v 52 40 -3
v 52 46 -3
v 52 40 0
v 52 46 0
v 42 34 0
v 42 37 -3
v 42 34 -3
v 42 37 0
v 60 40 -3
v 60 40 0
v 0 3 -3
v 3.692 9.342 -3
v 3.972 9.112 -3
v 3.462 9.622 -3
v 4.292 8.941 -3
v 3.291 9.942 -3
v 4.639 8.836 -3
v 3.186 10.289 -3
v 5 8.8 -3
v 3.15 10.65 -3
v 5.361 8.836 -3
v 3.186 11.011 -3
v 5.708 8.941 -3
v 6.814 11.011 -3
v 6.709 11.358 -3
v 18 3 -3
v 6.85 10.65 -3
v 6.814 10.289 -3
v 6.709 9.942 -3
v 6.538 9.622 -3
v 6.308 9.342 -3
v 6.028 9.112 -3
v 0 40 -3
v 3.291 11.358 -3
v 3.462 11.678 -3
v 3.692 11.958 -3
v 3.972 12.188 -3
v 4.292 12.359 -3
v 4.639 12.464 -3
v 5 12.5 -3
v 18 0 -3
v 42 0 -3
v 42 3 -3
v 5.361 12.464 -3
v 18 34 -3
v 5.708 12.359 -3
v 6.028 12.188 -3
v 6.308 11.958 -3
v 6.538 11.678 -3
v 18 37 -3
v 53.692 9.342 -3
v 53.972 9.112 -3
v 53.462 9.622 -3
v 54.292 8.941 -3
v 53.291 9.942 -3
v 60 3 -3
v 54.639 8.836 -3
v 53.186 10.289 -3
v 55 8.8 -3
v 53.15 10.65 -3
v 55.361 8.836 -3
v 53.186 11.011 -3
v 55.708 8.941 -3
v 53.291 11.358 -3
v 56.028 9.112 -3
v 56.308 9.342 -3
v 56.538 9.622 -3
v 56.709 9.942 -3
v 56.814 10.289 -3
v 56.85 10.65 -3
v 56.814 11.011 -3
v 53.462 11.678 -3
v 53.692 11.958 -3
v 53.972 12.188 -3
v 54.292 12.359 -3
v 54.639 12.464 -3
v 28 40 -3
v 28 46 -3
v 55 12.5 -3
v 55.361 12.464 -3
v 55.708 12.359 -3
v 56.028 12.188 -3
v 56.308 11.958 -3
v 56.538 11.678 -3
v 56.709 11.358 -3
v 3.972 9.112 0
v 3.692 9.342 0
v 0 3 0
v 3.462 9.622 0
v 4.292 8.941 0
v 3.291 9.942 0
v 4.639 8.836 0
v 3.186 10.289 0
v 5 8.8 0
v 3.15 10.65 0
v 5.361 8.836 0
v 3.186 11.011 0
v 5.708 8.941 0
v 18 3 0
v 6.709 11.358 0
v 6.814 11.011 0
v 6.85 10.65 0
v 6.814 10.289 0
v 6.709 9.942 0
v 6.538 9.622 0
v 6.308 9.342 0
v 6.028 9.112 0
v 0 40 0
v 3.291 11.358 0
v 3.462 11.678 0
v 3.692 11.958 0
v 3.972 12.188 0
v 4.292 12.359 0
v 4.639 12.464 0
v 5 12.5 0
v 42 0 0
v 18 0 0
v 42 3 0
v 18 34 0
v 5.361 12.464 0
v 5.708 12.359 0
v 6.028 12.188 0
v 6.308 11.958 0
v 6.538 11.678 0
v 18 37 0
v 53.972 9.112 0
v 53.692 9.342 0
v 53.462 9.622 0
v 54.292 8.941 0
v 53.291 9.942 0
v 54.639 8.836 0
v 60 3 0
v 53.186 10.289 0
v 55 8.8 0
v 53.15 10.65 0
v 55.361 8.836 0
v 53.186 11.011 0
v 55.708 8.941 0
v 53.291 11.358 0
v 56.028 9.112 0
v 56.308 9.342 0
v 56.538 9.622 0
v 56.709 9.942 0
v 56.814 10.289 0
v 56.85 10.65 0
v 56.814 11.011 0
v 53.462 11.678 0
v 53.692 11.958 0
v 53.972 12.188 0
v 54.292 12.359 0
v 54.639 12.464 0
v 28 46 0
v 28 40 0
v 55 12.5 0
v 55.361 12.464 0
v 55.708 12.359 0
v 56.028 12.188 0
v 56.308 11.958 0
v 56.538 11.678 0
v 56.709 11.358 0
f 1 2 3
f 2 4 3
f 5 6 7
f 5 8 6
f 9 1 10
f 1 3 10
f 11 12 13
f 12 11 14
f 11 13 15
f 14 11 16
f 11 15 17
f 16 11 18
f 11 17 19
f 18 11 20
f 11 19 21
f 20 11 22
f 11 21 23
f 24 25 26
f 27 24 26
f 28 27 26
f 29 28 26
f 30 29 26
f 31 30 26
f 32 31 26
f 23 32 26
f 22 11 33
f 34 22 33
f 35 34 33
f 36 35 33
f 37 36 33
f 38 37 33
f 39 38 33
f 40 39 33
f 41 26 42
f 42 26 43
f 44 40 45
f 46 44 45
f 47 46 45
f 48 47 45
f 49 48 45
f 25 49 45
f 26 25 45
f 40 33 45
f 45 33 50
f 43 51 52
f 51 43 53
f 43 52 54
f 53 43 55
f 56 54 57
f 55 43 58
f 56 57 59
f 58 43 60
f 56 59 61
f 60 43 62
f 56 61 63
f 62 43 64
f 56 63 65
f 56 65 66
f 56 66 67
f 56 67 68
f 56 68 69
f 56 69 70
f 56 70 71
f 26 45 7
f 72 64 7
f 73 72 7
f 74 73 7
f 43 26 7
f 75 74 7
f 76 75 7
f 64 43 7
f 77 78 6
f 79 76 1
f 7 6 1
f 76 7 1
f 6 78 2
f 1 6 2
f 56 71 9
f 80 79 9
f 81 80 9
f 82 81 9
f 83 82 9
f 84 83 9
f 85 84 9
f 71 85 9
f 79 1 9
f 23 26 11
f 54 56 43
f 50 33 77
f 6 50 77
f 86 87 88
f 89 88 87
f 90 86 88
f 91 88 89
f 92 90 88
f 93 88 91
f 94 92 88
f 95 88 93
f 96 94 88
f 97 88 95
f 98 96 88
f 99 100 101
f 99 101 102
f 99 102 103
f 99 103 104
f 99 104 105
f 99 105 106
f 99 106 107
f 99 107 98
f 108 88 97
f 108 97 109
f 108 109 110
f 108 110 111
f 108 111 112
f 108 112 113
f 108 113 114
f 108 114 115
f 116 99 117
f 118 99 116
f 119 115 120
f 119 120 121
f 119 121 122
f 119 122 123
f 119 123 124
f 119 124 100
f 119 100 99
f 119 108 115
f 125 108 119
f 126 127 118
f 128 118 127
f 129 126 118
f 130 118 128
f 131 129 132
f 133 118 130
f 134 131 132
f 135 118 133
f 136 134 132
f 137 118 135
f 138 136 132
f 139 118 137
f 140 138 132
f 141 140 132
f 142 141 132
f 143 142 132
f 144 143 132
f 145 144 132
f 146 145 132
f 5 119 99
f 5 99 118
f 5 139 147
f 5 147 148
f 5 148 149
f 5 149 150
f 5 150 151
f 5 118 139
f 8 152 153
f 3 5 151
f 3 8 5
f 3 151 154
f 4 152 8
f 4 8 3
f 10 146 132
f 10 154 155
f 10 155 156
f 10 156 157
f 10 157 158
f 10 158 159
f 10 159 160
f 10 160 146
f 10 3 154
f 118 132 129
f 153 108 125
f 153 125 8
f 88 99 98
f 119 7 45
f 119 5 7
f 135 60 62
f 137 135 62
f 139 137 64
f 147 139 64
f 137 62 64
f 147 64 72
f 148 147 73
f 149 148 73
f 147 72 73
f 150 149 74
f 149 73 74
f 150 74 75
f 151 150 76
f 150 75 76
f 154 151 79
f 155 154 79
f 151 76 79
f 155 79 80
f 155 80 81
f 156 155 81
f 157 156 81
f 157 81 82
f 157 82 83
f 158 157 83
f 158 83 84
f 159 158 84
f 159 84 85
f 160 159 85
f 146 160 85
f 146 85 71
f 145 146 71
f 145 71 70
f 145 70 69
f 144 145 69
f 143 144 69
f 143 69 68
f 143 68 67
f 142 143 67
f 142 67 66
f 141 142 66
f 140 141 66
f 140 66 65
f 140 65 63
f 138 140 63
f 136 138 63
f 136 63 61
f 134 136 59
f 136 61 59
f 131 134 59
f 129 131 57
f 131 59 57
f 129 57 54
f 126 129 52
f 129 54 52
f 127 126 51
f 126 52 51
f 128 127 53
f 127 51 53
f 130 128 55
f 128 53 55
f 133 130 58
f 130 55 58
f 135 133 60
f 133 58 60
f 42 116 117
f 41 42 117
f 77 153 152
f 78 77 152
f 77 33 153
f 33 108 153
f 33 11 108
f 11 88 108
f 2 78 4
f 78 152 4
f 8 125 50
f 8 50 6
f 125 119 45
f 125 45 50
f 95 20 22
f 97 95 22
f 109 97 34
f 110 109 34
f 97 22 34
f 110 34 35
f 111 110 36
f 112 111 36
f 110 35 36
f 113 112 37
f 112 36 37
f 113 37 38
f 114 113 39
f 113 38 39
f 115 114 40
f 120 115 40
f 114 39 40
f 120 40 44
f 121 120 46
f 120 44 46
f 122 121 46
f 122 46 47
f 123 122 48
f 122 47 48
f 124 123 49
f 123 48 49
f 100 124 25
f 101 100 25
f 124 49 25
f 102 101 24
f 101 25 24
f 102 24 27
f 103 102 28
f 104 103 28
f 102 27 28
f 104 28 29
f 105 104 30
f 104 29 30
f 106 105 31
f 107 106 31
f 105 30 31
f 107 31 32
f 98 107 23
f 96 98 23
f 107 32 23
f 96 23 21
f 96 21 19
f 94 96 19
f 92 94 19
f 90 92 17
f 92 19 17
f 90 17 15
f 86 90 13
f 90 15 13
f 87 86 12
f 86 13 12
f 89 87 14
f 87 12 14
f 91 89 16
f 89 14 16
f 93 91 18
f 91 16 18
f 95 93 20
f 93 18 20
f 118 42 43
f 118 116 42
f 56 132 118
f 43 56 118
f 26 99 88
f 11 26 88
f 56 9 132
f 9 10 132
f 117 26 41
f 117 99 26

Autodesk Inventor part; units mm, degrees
ref_plane "YZ Plane" through (0, 0, 0) normal (1, 0, 0) x (0, 1, 0)
ref_plane "XZ Plane" through (0, 0, 0) normal (0, 1, 0) x (-1, 0, 0)
ref_plane "XY Plane" through (0, 0, 0) normal (0, 0, 1) x (1, 0, 0)
sketch "Sketch1" plane through (0, 0, 0) normal (0, 0, 1) x (1, 0, 0)
  line L0 (42, 0) -> (60, 0) projected
  line L1 (42, 0) -> (18, 0) projected
  line L2 (0, 0) -> (18, 0) projected
  line L3 (60, 0) -> (60, 3) construction
  line L4 (0, 0) -> (0, 3) construction
  line L5 (24, 16) -> (47, 16) construction
  line L6 (60, 0) -> (0, 0)
  line L7 (0, 0) -> (0, 40)
  line L8 (0, 40) -> (60, 40)
  line L9 (60, 40) -> (60, 0)
  line L10 (52, 40) -> (28, 40)
  line L11 (28, 40) -> (28, 46)
  line L12 (28, 46) -> (52, 46)
  line L13 (52, 46) -> (52, 40)
  line L14 (42, 3) -> (42, 0) construction
  line L15 (18, 0) -> (18, 3) construction
  line L16 (42, 34) -> (18, 34)
  line L17 (18, 34) -> (18, 37)
  line L18 (18, 37) -> (42, 37)
  line L19 (42, 37) -> (42, 34)
  dimension "d0" = 40
  dimension "d1" = 8
  dimension "d2" = 24
  dimension "d3" = 6
  dimension "d4" = 3
  dimension "d5" = 3
  dimension "d6" = 24
extrude "Extrusion1" add sketch "Sketch1" against normal blind 3
sketch "Sketch2" plane through (0, 0, 0) normal (0, 0, 1) x (1, 0, 0)
  line L0 (42, 0) -> (42, 3) projected
  line L1 (60, 3) -> (42, 3) projected
  line L2 (60, 0) -> (60, 3) projected
  line L3 (60, 0) -> (42, 0) projected
  line L4 (18, 3) -> (18, 0) projected
  line L5 (18, 0) -> (0, 0) projected
  line L6 (0, 0) -> (0, 3) projected
  line L7 (18, 3) -> (0, 3) projected
extrude "Extrusion2" cut sketch "Sketch2" against normal blind 3
sketch "Sketch3" plane through (0, 0, -3) normal (0, 0, -1) x (-1, 0, 0)
  arc A0 (-3.15, 12.05) -> (-6.85, 12.05) centre (-5, 12.05) ccw construction
  line L0 (-3.15, 12.05) -> (-3.15, 9.25) construction
  arc A1 (-6.85, 9.25) -> (-3.15, 9.25) centre (-5, 9.25) ccw construction
  line L1 (-6.85, 9.25) -> (-6.85, 12.05) construction
  arc A2 (-9, 17.6) -> (-10, 16.6) centre (-9, 16.6) ccw construction
  line L2 (-10, 16.6) -> (-10, 4) construction
  line L3 (-10, 4) -> (0, 4) construction
  line L4 (0, 4) -> (0, 16.6) construction
  arc A3 (0, 16.6) -> (-1, 17.6) centre (-1, 16.6) ccw construction
  line L5 (-1, 17.6) -> (-9, 17.6) construction
  arc A4 (-53.15, 12.05) -> (-56.85, 12.05) centre (-55, 12.05) ccw construction
  line L6 (-53.15, 12.05) -> (-53.15, 9.25) construction
  arc A5 (-56.85, 9.25) -> (-53.15, 9.25) centre (-55, 9.25) ccw construction
  line L7 (-56.85, 9.25) -> (-56.85, 12.05) construction
  arc A6 (-59, 17.6) -> (-60, 16.6) centre (-59, 16.6) ccw construction
  line L8 (-60, 16.6) -> (-60, 4) construction
  line L9 (-60, 4) -> (-50, 4) construction
  line L10 (-50, 4) -> (-50, 16.6) construction
  arc A7 (-50, 16.6) -> (-51, 17.6) centre (-51, 16.6) ccw construction
  line L11 (-51, 17.6) -> (-59, 17.6) construction
  line L12 (-5, 9.25) -> (-5, 12.05) construction
  line L13 (-55, 9.25) -> (-55, 12.05) construction
  circle A8 centre (-5, 10.65) radius 1.85
  circle A9 centre (-55, 10.65) radius 1.85
  point P0 (0, 0)
extrude "Extrusion3" cut sketch "Sketch3" against normal blind 22.4
properties part number "Pan base top side bars"
